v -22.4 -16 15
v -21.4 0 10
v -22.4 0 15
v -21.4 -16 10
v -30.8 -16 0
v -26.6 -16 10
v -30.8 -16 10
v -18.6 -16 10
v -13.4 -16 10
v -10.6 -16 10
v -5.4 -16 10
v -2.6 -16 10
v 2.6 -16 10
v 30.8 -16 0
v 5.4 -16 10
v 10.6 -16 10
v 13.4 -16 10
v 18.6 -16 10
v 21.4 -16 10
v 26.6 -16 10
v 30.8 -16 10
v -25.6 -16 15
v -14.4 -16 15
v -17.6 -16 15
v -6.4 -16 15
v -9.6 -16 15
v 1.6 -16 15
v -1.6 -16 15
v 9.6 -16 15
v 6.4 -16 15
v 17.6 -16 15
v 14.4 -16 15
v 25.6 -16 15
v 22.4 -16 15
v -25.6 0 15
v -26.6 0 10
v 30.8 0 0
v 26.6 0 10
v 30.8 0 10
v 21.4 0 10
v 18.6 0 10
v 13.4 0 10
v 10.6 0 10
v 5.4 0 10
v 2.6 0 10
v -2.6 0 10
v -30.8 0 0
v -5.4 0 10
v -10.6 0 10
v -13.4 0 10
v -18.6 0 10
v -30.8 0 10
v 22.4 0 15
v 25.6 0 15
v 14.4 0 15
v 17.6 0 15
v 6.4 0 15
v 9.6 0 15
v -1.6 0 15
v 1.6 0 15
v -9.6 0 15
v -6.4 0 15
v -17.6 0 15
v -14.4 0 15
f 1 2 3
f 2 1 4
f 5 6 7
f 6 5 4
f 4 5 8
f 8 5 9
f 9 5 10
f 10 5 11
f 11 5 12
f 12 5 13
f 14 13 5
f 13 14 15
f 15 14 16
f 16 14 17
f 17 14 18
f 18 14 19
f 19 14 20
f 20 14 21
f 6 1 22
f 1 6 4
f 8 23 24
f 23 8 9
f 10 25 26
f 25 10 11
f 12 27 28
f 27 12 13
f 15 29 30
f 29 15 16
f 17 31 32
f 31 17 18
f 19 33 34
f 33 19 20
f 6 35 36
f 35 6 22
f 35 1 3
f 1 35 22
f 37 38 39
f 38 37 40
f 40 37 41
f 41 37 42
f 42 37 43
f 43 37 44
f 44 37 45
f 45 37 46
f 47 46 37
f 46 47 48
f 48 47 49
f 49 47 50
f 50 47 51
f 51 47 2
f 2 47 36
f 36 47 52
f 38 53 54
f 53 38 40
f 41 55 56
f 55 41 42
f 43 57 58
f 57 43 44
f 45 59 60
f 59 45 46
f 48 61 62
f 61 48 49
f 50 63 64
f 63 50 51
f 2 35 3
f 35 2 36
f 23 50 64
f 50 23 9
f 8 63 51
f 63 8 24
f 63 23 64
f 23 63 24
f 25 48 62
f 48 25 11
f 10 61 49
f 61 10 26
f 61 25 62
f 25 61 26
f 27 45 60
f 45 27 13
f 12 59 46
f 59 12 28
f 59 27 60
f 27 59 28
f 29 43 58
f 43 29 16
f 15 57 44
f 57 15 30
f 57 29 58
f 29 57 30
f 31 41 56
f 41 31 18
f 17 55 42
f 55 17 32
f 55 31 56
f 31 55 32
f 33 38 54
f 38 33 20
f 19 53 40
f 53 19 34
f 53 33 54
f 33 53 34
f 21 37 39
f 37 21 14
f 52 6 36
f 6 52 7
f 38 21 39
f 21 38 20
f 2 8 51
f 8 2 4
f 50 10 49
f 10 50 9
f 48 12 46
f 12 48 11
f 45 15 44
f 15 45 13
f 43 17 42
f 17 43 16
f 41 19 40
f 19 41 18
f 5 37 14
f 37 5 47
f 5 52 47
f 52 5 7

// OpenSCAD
$fn = 32;

// ----------------------------------------------------------------------
// Toothed rack, 7 teeth
// 8 mm pitch, 5 mm teeth
// ----------------------------------------------------------------------

// --- parameters (mm) ---
bar_w = 16;     // bar width (Y)
bar_h = 10;     // bar height (Z)
teeth = 7;      // number of teeth
pitch = 8;      // tooth pitch
tooth_h = 5;    // tooth height above the bar
root_w = 5.6;   // tooth width at the root
crest_w = 3.2;  // tooth width at the crest

// --- derived feature positions (mm) ---
span = (teeth - 1) * pitch;  // = 48   distance between the outer teeth
bar_l = span + root_w + 8;   // = 61.6   bar length: teeth plus 4 mm at each end
tooth_x = -span / 2;         // = -24   X of the first tooth
height = bar_h + tooth_h;    // = 15   overall height
feature_centers = [
  [tooth_x + 0 * pitch, -bar_w / 2],
  [tooth_x + 1 * pitch, -bar_w / 2],
  [tooth_x + 2 * pitch, -bar_w / 2],
  [tooth_x + 3 * pitch, -bar_w / 2],
  [tooth_x + 4 * pitch, -bar_w / 2],
  [tooth_x + 5 * pitch, -bar_w / 2],
  [tooth_x + 6 * pitch, -bar_w / 2]
];   // tooth centre line, drives the tooth loop

// bar with a rack of teeth, one extruded trapezoium per centre
module rack_tooth() {
  linear_extrude(height = bar_w)
    polygon(points = [
      [0, 0],
      [root_w, 0],
      [root_w / 2 + crest_w / 2, tooth_h + 1],
      [root_w / 2 - crest_w / 2, tooth_h + 1]
    ]);
}

union() {
  translate([-bar_l / 2, -bar_w, 0]) cube([bar_l, bar_w, bar_h]);
  for (centre = feature_centers)
    translate([centre[0] - root_w / 2, 0, bar_h - 1]) rotate([90, 0, 0]) rack_tooth();
}
